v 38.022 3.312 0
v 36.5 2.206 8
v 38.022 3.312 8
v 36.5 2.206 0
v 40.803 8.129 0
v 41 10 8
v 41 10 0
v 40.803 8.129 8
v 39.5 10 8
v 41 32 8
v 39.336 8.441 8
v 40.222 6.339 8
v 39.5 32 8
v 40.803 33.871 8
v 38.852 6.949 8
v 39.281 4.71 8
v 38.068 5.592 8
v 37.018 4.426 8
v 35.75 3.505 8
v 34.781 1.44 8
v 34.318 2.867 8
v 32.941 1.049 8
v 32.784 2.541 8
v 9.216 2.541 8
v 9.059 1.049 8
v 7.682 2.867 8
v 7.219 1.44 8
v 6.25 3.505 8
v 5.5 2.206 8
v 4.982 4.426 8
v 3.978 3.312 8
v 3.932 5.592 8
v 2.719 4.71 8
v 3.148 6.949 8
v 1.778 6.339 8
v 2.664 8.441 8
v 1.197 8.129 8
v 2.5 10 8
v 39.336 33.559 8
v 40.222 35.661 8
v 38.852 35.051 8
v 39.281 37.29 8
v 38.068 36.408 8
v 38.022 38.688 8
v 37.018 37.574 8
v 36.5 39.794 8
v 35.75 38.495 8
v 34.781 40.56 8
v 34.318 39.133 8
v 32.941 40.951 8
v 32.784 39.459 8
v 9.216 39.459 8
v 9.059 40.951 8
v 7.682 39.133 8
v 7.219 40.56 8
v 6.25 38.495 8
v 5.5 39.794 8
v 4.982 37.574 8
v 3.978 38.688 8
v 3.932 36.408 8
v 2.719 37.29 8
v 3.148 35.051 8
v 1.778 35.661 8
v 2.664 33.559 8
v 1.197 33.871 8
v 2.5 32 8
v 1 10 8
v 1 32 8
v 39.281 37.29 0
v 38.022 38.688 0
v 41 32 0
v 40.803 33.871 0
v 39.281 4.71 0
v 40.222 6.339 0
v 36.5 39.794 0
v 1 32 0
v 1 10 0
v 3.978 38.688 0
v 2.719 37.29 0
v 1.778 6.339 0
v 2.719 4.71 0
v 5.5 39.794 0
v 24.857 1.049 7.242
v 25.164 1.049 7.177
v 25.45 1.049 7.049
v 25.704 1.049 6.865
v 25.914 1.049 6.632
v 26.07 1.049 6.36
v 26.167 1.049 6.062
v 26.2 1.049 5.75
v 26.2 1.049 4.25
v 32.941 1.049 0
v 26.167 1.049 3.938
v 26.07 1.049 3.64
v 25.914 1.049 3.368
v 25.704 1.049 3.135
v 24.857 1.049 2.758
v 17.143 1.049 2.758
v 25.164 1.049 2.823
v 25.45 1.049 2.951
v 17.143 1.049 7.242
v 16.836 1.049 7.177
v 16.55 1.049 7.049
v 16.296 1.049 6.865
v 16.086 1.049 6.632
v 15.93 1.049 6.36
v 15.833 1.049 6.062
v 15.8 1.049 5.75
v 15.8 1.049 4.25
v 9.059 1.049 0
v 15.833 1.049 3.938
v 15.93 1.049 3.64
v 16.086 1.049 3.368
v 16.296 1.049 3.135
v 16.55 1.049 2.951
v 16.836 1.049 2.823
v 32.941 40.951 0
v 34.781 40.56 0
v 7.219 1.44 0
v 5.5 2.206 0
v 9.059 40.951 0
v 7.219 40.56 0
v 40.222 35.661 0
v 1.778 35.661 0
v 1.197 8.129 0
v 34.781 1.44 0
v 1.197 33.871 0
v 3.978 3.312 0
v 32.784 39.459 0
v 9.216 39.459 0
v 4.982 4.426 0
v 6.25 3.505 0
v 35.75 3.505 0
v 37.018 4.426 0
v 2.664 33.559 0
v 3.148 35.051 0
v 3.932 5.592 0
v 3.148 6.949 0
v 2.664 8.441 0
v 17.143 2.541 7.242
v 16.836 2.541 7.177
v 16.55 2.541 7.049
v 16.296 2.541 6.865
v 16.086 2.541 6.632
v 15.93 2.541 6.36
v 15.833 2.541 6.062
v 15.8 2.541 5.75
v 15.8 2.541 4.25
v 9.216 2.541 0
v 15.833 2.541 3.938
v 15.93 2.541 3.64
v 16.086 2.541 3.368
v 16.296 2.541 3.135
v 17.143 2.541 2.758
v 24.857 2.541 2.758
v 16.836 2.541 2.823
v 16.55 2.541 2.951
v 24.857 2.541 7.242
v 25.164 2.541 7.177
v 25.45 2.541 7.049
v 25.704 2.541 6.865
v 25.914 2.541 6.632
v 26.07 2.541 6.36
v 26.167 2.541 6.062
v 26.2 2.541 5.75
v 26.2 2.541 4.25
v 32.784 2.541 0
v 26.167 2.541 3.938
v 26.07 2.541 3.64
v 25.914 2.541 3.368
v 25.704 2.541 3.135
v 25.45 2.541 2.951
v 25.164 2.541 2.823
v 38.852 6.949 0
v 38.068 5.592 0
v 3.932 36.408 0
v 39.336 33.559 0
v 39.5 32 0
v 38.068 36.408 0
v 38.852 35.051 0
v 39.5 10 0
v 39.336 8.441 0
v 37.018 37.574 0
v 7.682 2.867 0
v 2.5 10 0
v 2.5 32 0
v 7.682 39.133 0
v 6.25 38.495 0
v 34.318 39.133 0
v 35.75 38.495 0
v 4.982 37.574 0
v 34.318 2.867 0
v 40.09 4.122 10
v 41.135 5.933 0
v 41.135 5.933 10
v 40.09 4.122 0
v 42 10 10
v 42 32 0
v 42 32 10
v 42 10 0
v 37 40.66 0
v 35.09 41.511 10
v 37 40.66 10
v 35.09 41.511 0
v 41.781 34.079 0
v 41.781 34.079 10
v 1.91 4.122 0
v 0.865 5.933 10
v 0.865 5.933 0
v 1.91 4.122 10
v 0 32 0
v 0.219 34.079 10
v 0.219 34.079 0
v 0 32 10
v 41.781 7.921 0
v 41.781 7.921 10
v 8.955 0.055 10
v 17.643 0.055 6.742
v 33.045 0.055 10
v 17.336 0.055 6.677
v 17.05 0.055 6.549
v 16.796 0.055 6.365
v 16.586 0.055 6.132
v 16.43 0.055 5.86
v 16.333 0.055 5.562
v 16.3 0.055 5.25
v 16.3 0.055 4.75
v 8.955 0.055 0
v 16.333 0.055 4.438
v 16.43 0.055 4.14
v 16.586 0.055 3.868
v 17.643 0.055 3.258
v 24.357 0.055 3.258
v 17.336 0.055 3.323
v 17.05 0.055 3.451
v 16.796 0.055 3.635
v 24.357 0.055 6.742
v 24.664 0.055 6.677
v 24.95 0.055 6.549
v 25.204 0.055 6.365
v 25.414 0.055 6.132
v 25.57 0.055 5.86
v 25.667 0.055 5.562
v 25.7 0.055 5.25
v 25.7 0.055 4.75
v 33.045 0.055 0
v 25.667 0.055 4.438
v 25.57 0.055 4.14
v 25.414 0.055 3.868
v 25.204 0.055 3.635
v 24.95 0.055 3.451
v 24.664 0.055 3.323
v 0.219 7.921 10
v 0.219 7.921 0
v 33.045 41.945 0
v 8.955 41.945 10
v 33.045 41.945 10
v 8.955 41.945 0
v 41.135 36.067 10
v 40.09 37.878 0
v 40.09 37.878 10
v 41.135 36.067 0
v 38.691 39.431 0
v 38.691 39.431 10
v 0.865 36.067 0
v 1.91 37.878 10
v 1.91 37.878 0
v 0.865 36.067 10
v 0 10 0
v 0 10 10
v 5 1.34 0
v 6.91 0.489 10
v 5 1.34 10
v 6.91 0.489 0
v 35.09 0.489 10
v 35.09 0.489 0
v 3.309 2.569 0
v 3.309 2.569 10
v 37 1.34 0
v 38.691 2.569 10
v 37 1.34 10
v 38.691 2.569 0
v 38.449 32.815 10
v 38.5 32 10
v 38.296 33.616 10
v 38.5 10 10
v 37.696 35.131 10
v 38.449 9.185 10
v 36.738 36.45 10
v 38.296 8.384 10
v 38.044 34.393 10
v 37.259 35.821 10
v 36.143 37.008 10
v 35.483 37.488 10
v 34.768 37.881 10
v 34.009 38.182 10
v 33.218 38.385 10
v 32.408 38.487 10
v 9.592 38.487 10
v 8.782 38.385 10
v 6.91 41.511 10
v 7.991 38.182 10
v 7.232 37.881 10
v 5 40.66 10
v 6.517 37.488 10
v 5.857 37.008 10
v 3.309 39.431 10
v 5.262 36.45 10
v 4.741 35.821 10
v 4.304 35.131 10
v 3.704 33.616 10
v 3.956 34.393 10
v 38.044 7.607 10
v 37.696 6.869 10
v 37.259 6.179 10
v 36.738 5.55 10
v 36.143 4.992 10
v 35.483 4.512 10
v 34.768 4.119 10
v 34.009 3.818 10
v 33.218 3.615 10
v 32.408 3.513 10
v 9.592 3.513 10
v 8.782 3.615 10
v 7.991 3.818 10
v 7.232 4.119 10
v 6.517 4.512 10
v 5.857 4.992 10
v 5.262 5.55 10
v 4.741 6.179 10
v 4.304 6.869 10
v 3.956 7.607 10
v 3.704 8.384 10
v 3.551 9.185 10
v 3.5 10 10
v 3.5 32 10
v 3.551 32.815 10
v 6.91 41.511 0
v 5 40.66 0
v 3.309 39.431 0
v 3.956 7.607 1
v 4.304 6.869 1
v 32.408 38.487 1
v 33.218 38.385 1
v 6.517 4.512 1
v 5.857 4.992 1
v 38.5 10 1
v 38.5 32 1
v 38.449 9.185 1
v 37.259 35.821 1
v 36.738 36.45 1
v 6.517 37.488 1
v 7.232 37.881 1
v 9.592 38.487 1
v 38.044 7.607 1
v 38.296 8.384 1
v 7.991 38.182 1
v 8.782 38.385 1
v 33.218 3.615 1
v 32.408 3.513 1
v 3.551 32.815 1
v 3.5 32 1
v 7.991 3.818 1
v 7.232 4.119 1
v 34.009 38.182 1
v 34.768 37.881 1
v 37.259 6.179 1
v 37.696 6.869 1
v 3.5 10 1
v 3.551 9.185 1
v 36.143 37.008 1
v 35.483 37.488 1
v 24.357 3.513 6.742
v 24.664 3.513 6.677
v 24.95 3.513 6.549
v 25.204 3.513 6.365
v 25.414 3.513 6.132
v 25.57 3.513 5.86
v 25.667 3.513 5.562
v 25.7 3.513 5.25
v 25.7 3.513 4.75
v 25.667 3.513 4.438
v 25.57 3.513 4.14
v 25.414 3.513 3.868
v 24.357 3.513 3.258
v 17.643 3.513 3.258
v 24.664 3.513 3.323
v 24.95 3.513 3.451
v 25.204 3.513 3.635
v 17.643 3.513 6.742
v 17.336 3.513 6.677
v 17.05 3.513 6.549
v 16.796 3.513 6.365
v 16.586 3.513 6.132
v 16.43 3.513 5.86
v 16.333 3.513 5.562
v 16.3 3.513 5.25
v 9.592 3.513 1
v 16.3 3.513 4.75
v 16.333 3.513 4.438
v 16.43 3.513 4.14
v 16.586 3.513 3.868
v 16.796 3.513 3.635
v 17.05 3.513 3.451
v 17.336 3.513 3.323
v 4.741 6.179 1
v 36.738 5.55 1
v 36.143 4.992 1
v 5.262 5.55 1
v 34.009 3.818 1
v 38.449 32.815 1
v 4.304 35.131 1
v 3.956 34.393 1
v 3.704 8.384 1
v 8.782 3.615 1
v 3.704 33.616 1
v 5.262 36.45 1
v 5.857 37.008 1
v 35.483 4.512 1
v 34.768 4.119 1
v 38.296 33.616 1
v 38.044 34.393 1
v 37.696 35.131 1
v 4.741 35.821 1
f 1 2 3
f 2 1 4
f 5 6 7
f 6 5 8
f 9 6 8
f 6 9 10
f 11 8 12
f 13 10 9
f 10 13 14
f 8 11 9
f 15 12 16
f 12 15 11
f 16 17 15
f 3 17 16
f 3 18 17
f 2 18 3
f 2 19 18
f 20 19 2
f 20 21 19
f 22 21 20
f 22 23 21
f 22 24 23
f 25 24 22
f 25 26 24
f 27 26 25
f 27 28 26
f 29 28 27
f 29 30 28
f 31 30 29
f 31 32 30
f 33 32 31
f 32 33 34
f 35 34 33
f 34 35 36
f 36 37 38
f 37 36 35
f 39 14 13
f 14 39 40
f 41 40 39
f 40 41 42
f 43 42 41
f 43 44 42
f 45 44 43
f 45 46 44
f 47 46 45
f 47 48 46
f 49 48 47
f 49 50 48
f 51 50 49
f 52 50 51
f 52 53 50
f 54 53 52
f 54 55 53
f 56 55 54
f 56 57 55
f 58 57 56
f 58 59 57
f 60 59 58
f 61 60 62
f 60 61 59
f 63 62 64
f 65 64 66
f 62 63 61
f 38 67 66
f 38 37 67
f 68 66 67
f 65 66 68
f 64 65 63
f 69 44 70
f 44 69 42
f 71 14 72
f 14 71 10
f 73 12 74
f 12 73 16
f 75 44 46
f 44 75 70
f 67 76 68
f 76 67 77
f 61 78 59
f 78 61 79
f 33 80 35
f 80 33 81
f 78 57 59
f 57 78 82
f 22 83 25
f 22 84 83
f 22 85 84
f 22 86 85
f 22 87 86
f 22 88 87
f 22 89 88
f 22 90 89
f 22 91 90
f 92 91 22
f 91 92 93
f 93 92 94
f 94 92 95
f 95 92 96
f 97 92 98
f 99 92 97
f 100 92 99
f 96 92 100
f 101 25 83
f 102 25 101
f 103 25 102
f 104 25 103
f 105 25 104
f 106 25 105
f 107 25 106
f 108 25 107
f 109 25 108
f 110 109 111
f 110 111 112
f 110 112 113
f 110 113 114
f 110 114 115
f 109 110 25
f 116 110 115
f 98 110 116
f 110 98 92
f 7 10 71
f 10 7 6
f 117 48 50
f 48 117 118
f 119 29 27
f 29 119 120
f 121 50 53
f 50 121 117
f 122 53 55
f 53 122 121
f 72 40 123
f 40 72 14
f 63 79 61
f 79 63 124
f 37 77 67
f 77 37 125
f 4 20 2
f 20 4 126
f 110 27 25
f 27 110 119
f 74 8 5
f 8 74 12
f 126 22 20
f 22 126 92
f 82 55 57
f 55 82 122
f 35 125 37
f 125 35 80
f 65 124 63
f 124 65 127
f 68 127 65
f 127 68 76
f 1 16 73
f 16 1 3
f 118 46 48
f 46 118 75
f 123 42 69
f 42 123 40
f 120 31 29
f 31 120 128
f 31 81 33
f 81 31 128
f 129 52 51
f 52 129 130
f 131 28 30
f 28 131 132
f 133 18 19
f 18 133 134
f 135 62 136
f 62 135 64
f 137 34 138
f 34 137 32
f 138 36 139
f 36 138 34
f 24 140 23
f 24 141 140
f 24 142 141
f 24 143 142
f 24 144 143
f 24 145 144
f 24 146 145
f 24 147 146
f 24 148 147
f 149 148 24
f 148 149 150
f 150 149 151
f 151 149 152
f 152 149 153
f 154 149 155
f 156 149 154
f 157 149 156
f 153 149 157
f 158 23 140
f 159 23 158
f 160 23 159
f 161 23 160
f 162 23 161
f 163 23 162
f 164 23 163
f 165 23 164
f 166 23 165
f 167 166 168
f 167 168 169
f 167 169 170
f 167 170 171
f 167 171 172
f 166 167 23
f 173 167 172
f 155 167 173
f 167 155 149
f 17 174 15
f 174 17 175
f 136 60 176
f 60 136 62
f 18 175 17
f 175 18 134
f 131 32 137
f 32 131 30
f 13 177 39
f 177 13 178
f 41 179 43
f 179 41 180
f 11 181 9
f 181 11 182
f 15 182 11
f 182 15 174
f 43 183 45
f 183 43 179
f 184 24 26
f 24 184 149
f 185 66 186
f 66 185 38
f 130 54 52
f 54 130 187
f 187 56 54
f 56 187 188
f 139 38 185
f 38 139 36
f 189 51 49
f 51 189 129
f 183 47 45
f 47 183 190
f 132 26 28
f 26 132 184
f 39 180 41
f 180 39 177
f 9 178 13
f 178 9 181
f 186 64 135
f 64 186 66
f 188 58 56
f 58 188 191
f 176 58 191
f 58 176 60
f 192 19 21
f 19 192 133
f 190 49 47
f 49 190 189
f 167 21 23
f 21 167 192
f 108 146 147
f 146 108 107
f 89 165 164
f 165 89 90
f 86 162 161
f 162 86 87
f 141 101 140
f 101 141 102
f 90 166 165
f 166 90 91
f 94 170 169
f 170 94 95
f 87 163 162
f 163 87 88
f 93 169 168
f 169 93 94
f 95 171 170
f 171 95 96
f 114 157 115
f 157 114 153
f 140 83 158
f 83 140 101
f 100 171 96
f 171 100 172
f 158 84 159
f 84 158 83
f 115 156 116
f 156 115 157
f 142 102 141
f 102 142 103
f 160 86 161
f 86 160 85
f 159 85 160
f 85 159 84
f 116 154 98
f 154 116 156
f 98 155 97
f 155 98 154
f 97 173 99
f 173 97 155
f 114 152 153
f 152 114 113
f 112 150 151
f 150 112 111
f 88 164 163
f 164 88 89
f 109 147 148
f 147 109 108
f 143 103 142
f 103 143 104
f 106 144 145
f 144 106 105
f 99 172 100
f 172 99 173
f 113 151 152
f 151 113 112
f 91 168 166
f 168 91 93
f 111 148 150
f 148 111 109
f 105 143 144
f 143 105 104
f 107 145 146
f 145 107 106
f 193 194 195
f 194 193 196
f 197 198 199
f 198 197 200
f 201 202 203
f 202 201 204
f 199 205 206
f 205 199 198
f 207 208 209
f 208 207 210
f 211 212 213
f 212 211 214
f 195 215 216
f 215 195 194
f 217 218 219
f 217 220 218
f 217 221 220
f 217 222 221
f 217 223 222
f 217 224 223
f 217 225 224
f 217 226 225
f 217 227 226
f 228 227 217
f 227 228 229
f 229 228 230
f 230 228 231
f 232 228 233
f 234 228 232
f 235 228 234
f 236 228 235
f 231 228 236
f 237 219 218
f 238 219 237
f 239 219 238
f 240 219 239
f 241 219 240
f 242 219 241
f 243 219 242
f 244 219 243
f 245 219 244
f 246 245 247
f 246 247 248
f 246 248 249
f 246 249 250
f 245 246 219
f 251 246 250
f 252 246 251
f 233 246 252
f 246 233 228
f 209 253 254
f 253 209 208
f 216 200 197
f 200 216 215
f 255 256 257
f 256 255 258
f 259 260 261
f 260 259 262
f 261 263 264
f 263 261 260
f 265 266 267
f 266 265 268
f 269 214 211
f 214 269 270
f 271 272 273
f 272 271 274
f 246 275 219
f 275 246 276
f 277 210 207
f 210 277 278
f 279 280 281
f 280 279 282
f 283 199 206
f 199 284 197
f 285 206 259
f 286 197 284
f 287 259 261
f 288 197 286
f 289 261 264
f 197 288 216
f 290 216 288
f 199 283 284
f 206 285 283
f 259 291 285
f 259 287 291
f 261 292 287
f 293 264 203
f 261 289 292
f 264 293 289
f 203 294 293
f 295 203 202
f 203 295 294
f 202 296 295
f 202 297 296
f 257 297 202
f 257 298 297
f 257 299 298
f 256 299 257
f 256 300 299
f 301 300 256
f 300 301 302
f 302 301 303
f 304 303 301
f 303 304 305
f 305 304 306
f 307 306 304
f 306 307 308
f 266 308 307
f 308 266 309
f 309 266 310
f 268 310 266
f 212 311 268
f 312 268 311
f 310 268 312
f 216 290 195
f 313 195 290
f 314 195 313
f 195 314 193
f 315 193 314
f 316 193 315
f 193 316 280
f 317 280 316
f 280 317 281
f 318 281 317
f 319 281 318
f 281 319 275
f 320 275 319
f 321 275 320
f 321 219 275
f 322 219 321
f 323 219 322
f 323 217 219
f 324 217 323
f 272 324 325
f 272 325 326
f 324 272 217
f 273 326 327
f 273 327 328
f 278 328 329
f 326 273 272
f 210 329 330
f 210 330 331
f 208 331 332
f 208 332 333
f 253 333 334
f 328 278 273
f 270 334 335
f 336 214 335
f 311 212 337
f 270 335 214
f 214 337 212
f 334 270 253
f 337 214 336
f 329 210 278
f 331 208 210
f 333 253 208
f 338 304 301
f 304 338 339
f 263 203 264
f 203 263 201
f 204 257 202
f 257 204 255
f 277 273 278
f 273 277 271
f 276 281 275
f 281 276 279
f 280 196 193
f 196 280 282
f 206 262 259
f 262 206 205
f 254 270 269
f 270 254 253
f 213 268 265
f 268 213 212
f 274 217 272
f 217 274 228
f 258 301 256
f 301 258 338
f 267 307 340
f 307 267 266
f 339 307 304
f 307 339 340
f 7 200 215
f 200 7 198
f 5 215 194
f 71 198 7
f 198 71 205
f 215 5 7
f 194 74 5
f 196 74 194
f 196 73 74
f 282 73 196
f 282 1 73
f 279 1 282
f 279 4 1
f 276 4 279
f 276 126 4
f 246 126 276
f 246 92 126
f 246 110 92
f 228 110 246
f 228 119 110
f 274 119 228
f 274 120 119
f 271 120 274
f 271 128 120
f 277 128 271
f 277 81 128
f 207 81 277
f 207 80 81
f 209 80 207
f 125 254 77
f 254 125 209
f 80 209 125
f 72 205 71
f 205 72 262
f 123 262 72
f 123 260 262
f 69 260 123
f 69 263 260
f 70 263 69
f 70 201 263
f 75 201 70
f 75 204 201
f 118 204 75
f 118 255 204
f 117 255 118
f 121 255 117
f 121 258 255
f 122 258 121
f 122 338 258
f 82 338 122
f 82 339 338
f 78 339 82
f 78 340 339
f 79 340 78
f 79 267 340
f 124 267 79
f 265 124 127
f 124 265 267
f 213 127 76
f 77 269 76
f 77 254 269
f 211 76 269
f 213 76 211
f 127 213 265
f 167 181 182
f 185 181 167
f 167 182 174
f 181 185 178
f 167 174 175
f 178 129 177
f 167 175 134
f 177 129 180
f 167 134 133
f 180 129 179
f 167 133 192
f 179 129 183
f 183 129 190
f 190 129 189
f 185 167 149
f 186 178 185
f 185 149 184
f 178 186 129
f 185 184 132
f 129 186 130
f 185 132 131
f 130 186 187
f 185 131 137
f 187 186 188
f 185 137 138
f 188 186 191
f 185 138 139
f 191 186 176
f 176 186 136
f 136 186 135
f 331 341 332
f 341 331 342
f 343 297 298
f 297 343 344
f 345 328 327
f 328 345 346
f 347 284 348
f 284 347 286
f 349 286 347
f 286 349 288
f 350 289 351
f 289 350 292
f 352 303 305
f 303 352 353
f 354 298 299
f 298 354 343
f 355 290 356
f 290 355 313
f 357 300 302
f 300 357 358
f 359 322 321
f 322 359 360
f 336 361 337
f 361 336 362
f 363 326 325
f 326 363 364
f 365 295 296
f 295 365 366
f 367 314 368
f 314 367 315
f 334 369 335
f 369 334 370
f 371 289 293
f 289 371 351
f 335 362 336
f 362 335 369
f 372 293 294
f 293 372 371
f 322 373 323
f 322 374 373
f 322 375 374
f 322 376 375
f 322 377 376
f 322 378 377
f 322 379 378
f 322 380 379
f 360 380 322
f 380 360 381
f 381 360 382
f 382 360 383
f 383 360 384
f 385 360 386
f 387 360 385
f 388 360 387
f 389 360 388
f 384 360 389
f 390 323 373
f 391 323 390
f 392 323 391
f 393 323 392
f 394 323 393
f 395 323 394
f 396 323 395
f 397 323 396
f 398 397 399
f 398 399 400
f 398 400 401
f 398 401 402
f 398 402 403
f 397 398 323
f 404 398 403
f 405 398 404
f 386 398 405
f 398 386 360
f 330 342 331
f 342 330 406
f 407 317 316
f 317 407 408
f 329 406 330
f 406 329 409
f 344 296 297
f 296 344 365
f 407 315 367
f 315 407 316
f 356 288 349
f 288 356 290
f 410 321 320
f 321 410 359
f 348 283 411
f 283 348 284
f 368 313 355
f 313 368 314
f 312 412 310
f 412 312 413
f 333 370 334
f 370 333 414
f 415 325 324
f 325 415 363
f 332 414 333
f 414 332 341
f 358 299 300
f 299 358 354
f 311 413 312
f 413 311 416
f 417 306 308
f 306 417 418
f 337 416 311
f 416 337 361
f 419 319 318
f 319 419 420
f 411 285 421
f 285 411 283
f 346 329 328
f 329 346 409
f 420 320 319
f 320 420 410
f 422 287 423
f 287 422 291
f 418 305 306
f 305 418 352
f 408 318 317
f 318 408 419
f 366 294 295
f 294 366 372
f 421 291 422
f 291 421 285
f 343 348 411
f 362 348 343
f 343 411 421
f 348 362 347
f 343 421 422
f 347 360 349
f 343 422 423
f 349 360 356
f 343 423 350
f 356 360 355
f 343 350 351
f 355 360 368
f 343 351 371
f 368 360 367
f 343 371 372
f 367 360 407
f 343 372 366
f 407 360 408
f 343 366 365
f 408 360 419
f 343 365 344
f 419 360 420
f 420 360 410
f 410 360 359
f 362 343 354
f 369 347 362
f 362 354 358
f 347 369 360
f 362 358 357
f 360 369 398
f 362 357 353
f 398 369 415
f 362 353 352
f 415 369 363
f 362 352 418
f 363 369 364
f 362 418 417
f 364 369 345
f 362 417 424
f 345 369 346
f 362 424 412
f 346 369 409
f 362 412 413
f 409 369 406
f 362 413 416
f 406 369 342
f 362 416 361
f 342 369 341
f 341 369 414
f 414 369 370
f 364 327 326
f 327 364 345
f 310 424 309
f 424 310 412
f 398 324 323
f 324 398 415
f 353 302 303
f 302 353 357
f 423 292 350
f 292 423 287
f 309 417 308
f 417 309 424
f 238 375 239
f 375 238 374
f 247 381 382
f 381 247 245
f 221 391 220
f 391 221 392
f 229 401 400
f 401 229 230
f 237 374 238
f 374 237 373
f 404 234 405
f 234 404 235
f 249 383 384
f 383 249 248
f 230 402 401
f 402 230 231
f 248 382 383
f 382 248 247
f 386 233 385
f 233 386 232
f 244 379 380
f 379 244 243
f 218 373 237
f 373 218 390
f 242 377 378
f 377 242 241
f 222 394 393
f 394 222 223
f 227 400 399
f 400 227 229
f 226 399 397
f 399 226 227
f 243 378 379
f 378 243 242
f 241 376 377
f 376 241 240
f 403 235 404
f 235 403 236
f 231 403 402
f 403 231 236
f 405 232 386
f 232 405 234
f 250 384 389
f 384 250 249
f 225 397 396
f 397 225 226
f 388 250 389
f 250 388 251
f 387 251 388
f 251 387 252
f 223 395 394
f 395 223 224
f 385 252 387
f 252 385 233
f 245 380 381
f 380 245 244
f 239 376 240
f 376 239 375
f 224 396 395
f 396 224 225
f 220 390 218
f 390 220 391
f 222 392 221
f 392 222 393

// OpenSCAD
// file: parts/custom_lid.scad
include <../config.scad>
include <../include/modules.scad>
include <../include/sizes.scad>

module customLid() {
	difference() {
		// Main body shape
		roundedCube(lid_dimens, lid_corner_rad, $fn=fn);

		// PCB housing
		translate(custom_pcb_housing_pos)
		roundedCube(custom_pcb_housing_dimens + [0, 0, 1], custom_pcb_housing_corner_rad, $fn);

		// USB-C connector hole
		translate(usb_c_hole_pos+[0, .03, 0])
		translate([0, usb_c_hole_dimens.y])
		rotate([90])
		roundedCube(usb_c_hole_dimens+[0, 0, 1], usb_c_corner_rad, $fn=fn);

		// Carve out space between outer walls and PCB housing
		translate([1, 1, -1]*wall_thickn)
		difference() {
			roundedCube(lid_dimens-[2, 2, 1]*wall_thickn, lid_corner_rad-wall_thickn, $fn=fn);

			translate([
				(lid_dimens.x-4*wall_thickn-custom_pcb_housing_dimens.x)/2,
				(lid_dimens.y-4*wall_thickn-custom_pcb_housing_dimens.y)/2,
				-1
			])
			roundedCube(custom_pcb_housing_dimens+[2, 2, 10]*wall_thickn, custom_pcb_housing_corner_rad+wall_thickn, $fn=fn);

			// Keep material around USB connector
			translate(usb_c_hole_pos+[-1.5, .03, .5])
			translate([0, usb_c_hole_dimens.y+1])
			rotate([90])
			roundedCube(usb_c_hole_dimens+[1, 1, 1], usb_c_corner_rad, $fn=fn);
		}
	}
}
// file: include/modules.scad
module roundedCube(dimens, corner_radius, $fn=50) {
	hull() {
		translate([corner_radius, corner_radius])
		cylinder(r=corner_radius, h=dimens.z);

		translate([corner_radius, dimens.y-corner_radius])
		cylinder(r=corner_radius, h=dimens.z);

		translate([dimens.x-corner_radius, corner_radius])
		cylinder(r=corner_radius, h=dimens.z);

		translate([dimens.x-corner_radius, dimens.y-corner_radius])
		cylinder(r=corner_radius, h=dimens.z);
	}
}

module clipDent(dimens) {
	angle=atan2(dimens.z, dimens.y);

	difference() {
		cube(dimens);

		rotate([angle])
		translate([-1, 0])
		cube([dimens.x*2, dimens.y*10, dimens.z*10]);
	}
}

module hingeGuide(r1, r2, h, dist, center=false, $fn=50) {
	hull() {
		cylinder(r=r1, h=h, $fn=$fn, center=center);

		translate([-dist, 0])
		cylinder(r=r2, h=h, $fn=$fn, center=center);
	}
}

function swap(vector) = [vector[1], vector[0]];
// file: include/sizes.scad
include <../config.scad>

fn=30;

wall_thickn=1;

main_body_h=8;
main_body_dimens=[42, 42, main_body_h];
main_body_corner_rad=10;

membrane_inset_dimens=[40, 40, 1];
membrane_inset_pos=[
    (main_body_dimens.x-membrane_inset_dimens.x)/2,
    (main_body_dimens.y-membrane_inset_dimens.y)/2,
    main_body_dimens.z-membrane_inset_dimens.z
];
membrane_inset_corner_rad=main_body_corner_rad-membrane_inset_pos.x;

pcb_housing_dimens=[35, 35, 4.5];
pcb_housing_pos=[
    (main_body_dimens.x-pcb_housing_dimens.x)/2,
    (main_body_dimens.y-pcb_housing_dimens.y)/2,
    main_body_dimens.z-membrane_inset_dimens.z-pcb_housing_dimens.z
];
pcb_housing_corner_rad=main_body_corner_rad-pcb_housing_pos.x;

pcb_standoffs_h=2;
pcb_standoffs_dimens=[1.5, 1.5, pcb_standoffs_h];
pcb_standoffs_positions=[
    // Bottom-left
    [pcb_housing_pos.x, pcb_housing_pos.y+6],
    [pcb_housing_pos.x+6, pcb_housing_pos.y],

    // Bottom right
    [pcb_housing_pos.x+pcb_housing_dimens.x-pcb_standoffs_dimens.x, pcb_housing_pos.y+6],
    [pcb_housing_pos.x+pcb_housing_dimens.x-pcb_standoffs_dimens.x-6, pcb_housing_pos.y],

    // Top left
    [pcb_housing_pos.x, pcb_housing_pos.y+pcb_housing_dimens.y-pcb_standoffs_dimens.y-6],
    [pcb_housing_pos.x+6, pcb_housing_pos.y+pcb_housing_dimens.y-pcb_standoffs_dimens.y],

    // Top right
    [pcb_housing_pos.x+pcb_housing_dimens.x-pcb_standoffs_dimens.x, pcb_housing_pos.y+pcb_housing_dimens.y-pcb_standoffs_dimens.y-6],
    [pcb_housing_pos.x+pcb_housing_dimens.x-pcb_standoffs_dimens.x-6, pcb_housing_pos.y+pcb_housing_dimens.y-pcb_standoffs_dimens.y],
];

bottom_cavity_dimens=[
    30,
    30,
    pcb_housing_pos.z-wall_thickn
];
bottom_cavity_pos=[
    (main_body_dimens.x-bottom_cavity_dimens.x)/2,
    (main_body_dimens.y-bottom_cavity_dimens.y)/2
];
bottom_cavity_corner_rad=5;

button_hole_rad=2.5;
button_hole_pos=[main_body_dimens.x/2, 8.9];

swd_hole_dimens=[3, 11];
swd_hole_pos=[32, 10];

uart_hole_dimens=[4.7, 4.7];
uart_hole_pos=[8.5, 10];


battery_hole_rad=21.5/2;
battery_hole_pos=[9.4, 12.9];

battery_housing_rad=battery_hole_rad+wall_thickn;
battery_housing_h=3.7;
battery_housing_pos=concat(
    battery_hole_pos-[1,1]*wall_thickn,
    [pcb_housing_pos.z+pcb_standoffs_h-battery_housing_h]
);

battery_big_clip_dimens=[7, 4, 0.8];
battery_small_clip_dimens=[9, 1.8, 0.8];
battery_small_clip_cutout_dimens=[battery_small_clip_dimens.x-3, 2.3, 1];
battery_big_clip_pos1=[-battery_big_clip_dimens.x/2, -battery_hole_rad-battery_big_clip_dimens.y/4];
battery_small_clips_pos1=[-battery_small_clip_dimens.x/2, -battery_hole_rad-battery_small_clip_dimens.y/4-0.2];
battery_clips_rot_angle=[0, 0, 45];
battery_clips_pos2=battery_hole_pos;
battery_small_clip_width=(battery_small_clip_dimens.x-battery_small_clip_cutout_dimens.x)/2;

battery_removal_dent_size=[
    battery_small_clip_cutout_dimens.x,
    wall_thickn*2,
    battery_housing_h
];

battery_removal_dent_pos1=[
    -battery_removal_dent_size.x/2,
    -battery_hole_rad-battery_removal_dent_size.y/1.3 // magic number
];
battery_removal_dent_rot=battery_clips_rot_angle + [0, 0, 180];

membr_slots_dimens=[5, 2];
membr_spacial_slots_dimens=[1.5, 6];
membr_spacial_offset_center=4;
lid_clips_slot_z=1.3;
lid_clips_slot_dimens=[0.5, membr_spacial_slots_dimens.y, main_body_dimens.z-lid_clips_slot_z];

custom_lid_clips_slot_dimens=lid_clips_slot_dimens-[0, 0, 3];

pcb_thickn=1.4; // just to be on the safe side
pcb_clip_h=2;

pcb_small_clip_dimens=[
    pcb_standoffs_dimens.x,
    pcb_standoffs_dimens.y,
    pcb_housing_dimens.z-pcb_thickn-pcb_standoffs_dimens.z
];
pcb_small_clip_pos_z=pcb_housing_pos.z+pcb_standoffs_dimens.z+pcb_thickn;
pcb_small_clip_positions=[
    // The ones on the right
    pcb_standoffs_positions[2],
    pcb_standoffs_positions[6]
];

pcb_holder_stopper_dimens=[
    1.5,
    5,
    membrane_inset_dimens.z
];

pcb_holder_stopper_pos=[
    pcb_housing_pos.x-pcb_holder_stopper_dimens.x,
    (main_body_dimens.y-pcb_holder_stopper_dimens.y)/2,
    membrane_inset_pos.z
];

pcb_holder_hole_dimens=[
    (main_body_dimens.x-pcb_housing_dimens.x)/2,
    4,
    membrane_inset_pos.z-pcb_housing_pos.z-pcb_thickn-pcb_standoffs_dimens.z
];

pcb_holder_dimens=[
    5.6,
    pcb_holder_hole_dimens.y - .3,
    pcb_holder_hole_dimens.z - .3
];

pcb_holder_hole_pos=[
    0,
    (main_body_dimens.y-pcb_holder_hole_dimens.y)/2,
    pcb_housing_pos.z+pcb_standoffs_dimens.z+pcb_thickn
];

screw_hole_rad=screw_diam*1.2/2;
screw_rod_rad=screw_hole_rad+wall_thickn;
screw_rod_h=pcb_housing_pos.z+pcb_standoffs_dimens.z;


hinges_hole_rad=1.5;
hinges_hole_z=3.2;

hinges_hole_guide_rad_top=2;
hinges_hole_guide_thickn=0.5;

alignment_notch_dimens=[
    3,
    wall_thickn + 0.08,
    3
];
alignment_notch_pos=[
    main_body_dimens.x/2 - 8.5,
    0,
    main_body_dimens.z - alignment_notch_dimens.z
];


// Custom "lid" sizes

lid_dimens=[main_body_dimens.x, main_body_dimens.y, 10];
lid_corner_rad=main_body_corner_rad;

custom_pcb_thickn=1;

custom_pcb_housing_dimens=[
    pcb_housing_dimens.x,
    pcb_housing_dimens.y,
    lid_dimens.z-wall_thickn
];
custom_pcb_housing_pos=[
    (lid_dimens.x - custom_pcb_housing_dimens.x)/2,
    (lid_dimens.y - custom_pcb_housing_dimens.y)/2,
    lid_dimens.z - custom_pcb_housing_dimens.z
];
custom_pcb_housing_corner_rad=lid_corner_rad-custom_pcb_housing_pos.x;

usb_c_hole_dimens=[
    9.4,
    3.5,
    (lid_dimens.y-custom_pcb_housing_dimens.y)/2
];

// TODO update once we have the PCB
usb_c_hole_pos=[
    (lid_dimens.x - usb_c_hole_dimens.x)/2,
    0,
    (lid_dimens.z - usb_c_hole_dimens.z)/2,    
];

usb_c_corner_rad=1.5;

lid_screw_pos=[
    lid_dimens.x/2,
    lid_dimens.y-9
];
// file: config.scad
screw_diam=2;

// For custom bottom lid
screw_pos=[9, 33];

// Set to false if you want to use it with the IKEA bottom lid
carve_swd_hole=true;

screw_hole_fn=6;

build_supports="none";

supports_thickn=0.2;
supports_contanct_z_dist=0.2; // detachable (hopefully)
// main file
include <config.scad>
include <include/sizes.scad>
include <include/modules.scad>
include <parts/custom_lid.scad>

customLid();
